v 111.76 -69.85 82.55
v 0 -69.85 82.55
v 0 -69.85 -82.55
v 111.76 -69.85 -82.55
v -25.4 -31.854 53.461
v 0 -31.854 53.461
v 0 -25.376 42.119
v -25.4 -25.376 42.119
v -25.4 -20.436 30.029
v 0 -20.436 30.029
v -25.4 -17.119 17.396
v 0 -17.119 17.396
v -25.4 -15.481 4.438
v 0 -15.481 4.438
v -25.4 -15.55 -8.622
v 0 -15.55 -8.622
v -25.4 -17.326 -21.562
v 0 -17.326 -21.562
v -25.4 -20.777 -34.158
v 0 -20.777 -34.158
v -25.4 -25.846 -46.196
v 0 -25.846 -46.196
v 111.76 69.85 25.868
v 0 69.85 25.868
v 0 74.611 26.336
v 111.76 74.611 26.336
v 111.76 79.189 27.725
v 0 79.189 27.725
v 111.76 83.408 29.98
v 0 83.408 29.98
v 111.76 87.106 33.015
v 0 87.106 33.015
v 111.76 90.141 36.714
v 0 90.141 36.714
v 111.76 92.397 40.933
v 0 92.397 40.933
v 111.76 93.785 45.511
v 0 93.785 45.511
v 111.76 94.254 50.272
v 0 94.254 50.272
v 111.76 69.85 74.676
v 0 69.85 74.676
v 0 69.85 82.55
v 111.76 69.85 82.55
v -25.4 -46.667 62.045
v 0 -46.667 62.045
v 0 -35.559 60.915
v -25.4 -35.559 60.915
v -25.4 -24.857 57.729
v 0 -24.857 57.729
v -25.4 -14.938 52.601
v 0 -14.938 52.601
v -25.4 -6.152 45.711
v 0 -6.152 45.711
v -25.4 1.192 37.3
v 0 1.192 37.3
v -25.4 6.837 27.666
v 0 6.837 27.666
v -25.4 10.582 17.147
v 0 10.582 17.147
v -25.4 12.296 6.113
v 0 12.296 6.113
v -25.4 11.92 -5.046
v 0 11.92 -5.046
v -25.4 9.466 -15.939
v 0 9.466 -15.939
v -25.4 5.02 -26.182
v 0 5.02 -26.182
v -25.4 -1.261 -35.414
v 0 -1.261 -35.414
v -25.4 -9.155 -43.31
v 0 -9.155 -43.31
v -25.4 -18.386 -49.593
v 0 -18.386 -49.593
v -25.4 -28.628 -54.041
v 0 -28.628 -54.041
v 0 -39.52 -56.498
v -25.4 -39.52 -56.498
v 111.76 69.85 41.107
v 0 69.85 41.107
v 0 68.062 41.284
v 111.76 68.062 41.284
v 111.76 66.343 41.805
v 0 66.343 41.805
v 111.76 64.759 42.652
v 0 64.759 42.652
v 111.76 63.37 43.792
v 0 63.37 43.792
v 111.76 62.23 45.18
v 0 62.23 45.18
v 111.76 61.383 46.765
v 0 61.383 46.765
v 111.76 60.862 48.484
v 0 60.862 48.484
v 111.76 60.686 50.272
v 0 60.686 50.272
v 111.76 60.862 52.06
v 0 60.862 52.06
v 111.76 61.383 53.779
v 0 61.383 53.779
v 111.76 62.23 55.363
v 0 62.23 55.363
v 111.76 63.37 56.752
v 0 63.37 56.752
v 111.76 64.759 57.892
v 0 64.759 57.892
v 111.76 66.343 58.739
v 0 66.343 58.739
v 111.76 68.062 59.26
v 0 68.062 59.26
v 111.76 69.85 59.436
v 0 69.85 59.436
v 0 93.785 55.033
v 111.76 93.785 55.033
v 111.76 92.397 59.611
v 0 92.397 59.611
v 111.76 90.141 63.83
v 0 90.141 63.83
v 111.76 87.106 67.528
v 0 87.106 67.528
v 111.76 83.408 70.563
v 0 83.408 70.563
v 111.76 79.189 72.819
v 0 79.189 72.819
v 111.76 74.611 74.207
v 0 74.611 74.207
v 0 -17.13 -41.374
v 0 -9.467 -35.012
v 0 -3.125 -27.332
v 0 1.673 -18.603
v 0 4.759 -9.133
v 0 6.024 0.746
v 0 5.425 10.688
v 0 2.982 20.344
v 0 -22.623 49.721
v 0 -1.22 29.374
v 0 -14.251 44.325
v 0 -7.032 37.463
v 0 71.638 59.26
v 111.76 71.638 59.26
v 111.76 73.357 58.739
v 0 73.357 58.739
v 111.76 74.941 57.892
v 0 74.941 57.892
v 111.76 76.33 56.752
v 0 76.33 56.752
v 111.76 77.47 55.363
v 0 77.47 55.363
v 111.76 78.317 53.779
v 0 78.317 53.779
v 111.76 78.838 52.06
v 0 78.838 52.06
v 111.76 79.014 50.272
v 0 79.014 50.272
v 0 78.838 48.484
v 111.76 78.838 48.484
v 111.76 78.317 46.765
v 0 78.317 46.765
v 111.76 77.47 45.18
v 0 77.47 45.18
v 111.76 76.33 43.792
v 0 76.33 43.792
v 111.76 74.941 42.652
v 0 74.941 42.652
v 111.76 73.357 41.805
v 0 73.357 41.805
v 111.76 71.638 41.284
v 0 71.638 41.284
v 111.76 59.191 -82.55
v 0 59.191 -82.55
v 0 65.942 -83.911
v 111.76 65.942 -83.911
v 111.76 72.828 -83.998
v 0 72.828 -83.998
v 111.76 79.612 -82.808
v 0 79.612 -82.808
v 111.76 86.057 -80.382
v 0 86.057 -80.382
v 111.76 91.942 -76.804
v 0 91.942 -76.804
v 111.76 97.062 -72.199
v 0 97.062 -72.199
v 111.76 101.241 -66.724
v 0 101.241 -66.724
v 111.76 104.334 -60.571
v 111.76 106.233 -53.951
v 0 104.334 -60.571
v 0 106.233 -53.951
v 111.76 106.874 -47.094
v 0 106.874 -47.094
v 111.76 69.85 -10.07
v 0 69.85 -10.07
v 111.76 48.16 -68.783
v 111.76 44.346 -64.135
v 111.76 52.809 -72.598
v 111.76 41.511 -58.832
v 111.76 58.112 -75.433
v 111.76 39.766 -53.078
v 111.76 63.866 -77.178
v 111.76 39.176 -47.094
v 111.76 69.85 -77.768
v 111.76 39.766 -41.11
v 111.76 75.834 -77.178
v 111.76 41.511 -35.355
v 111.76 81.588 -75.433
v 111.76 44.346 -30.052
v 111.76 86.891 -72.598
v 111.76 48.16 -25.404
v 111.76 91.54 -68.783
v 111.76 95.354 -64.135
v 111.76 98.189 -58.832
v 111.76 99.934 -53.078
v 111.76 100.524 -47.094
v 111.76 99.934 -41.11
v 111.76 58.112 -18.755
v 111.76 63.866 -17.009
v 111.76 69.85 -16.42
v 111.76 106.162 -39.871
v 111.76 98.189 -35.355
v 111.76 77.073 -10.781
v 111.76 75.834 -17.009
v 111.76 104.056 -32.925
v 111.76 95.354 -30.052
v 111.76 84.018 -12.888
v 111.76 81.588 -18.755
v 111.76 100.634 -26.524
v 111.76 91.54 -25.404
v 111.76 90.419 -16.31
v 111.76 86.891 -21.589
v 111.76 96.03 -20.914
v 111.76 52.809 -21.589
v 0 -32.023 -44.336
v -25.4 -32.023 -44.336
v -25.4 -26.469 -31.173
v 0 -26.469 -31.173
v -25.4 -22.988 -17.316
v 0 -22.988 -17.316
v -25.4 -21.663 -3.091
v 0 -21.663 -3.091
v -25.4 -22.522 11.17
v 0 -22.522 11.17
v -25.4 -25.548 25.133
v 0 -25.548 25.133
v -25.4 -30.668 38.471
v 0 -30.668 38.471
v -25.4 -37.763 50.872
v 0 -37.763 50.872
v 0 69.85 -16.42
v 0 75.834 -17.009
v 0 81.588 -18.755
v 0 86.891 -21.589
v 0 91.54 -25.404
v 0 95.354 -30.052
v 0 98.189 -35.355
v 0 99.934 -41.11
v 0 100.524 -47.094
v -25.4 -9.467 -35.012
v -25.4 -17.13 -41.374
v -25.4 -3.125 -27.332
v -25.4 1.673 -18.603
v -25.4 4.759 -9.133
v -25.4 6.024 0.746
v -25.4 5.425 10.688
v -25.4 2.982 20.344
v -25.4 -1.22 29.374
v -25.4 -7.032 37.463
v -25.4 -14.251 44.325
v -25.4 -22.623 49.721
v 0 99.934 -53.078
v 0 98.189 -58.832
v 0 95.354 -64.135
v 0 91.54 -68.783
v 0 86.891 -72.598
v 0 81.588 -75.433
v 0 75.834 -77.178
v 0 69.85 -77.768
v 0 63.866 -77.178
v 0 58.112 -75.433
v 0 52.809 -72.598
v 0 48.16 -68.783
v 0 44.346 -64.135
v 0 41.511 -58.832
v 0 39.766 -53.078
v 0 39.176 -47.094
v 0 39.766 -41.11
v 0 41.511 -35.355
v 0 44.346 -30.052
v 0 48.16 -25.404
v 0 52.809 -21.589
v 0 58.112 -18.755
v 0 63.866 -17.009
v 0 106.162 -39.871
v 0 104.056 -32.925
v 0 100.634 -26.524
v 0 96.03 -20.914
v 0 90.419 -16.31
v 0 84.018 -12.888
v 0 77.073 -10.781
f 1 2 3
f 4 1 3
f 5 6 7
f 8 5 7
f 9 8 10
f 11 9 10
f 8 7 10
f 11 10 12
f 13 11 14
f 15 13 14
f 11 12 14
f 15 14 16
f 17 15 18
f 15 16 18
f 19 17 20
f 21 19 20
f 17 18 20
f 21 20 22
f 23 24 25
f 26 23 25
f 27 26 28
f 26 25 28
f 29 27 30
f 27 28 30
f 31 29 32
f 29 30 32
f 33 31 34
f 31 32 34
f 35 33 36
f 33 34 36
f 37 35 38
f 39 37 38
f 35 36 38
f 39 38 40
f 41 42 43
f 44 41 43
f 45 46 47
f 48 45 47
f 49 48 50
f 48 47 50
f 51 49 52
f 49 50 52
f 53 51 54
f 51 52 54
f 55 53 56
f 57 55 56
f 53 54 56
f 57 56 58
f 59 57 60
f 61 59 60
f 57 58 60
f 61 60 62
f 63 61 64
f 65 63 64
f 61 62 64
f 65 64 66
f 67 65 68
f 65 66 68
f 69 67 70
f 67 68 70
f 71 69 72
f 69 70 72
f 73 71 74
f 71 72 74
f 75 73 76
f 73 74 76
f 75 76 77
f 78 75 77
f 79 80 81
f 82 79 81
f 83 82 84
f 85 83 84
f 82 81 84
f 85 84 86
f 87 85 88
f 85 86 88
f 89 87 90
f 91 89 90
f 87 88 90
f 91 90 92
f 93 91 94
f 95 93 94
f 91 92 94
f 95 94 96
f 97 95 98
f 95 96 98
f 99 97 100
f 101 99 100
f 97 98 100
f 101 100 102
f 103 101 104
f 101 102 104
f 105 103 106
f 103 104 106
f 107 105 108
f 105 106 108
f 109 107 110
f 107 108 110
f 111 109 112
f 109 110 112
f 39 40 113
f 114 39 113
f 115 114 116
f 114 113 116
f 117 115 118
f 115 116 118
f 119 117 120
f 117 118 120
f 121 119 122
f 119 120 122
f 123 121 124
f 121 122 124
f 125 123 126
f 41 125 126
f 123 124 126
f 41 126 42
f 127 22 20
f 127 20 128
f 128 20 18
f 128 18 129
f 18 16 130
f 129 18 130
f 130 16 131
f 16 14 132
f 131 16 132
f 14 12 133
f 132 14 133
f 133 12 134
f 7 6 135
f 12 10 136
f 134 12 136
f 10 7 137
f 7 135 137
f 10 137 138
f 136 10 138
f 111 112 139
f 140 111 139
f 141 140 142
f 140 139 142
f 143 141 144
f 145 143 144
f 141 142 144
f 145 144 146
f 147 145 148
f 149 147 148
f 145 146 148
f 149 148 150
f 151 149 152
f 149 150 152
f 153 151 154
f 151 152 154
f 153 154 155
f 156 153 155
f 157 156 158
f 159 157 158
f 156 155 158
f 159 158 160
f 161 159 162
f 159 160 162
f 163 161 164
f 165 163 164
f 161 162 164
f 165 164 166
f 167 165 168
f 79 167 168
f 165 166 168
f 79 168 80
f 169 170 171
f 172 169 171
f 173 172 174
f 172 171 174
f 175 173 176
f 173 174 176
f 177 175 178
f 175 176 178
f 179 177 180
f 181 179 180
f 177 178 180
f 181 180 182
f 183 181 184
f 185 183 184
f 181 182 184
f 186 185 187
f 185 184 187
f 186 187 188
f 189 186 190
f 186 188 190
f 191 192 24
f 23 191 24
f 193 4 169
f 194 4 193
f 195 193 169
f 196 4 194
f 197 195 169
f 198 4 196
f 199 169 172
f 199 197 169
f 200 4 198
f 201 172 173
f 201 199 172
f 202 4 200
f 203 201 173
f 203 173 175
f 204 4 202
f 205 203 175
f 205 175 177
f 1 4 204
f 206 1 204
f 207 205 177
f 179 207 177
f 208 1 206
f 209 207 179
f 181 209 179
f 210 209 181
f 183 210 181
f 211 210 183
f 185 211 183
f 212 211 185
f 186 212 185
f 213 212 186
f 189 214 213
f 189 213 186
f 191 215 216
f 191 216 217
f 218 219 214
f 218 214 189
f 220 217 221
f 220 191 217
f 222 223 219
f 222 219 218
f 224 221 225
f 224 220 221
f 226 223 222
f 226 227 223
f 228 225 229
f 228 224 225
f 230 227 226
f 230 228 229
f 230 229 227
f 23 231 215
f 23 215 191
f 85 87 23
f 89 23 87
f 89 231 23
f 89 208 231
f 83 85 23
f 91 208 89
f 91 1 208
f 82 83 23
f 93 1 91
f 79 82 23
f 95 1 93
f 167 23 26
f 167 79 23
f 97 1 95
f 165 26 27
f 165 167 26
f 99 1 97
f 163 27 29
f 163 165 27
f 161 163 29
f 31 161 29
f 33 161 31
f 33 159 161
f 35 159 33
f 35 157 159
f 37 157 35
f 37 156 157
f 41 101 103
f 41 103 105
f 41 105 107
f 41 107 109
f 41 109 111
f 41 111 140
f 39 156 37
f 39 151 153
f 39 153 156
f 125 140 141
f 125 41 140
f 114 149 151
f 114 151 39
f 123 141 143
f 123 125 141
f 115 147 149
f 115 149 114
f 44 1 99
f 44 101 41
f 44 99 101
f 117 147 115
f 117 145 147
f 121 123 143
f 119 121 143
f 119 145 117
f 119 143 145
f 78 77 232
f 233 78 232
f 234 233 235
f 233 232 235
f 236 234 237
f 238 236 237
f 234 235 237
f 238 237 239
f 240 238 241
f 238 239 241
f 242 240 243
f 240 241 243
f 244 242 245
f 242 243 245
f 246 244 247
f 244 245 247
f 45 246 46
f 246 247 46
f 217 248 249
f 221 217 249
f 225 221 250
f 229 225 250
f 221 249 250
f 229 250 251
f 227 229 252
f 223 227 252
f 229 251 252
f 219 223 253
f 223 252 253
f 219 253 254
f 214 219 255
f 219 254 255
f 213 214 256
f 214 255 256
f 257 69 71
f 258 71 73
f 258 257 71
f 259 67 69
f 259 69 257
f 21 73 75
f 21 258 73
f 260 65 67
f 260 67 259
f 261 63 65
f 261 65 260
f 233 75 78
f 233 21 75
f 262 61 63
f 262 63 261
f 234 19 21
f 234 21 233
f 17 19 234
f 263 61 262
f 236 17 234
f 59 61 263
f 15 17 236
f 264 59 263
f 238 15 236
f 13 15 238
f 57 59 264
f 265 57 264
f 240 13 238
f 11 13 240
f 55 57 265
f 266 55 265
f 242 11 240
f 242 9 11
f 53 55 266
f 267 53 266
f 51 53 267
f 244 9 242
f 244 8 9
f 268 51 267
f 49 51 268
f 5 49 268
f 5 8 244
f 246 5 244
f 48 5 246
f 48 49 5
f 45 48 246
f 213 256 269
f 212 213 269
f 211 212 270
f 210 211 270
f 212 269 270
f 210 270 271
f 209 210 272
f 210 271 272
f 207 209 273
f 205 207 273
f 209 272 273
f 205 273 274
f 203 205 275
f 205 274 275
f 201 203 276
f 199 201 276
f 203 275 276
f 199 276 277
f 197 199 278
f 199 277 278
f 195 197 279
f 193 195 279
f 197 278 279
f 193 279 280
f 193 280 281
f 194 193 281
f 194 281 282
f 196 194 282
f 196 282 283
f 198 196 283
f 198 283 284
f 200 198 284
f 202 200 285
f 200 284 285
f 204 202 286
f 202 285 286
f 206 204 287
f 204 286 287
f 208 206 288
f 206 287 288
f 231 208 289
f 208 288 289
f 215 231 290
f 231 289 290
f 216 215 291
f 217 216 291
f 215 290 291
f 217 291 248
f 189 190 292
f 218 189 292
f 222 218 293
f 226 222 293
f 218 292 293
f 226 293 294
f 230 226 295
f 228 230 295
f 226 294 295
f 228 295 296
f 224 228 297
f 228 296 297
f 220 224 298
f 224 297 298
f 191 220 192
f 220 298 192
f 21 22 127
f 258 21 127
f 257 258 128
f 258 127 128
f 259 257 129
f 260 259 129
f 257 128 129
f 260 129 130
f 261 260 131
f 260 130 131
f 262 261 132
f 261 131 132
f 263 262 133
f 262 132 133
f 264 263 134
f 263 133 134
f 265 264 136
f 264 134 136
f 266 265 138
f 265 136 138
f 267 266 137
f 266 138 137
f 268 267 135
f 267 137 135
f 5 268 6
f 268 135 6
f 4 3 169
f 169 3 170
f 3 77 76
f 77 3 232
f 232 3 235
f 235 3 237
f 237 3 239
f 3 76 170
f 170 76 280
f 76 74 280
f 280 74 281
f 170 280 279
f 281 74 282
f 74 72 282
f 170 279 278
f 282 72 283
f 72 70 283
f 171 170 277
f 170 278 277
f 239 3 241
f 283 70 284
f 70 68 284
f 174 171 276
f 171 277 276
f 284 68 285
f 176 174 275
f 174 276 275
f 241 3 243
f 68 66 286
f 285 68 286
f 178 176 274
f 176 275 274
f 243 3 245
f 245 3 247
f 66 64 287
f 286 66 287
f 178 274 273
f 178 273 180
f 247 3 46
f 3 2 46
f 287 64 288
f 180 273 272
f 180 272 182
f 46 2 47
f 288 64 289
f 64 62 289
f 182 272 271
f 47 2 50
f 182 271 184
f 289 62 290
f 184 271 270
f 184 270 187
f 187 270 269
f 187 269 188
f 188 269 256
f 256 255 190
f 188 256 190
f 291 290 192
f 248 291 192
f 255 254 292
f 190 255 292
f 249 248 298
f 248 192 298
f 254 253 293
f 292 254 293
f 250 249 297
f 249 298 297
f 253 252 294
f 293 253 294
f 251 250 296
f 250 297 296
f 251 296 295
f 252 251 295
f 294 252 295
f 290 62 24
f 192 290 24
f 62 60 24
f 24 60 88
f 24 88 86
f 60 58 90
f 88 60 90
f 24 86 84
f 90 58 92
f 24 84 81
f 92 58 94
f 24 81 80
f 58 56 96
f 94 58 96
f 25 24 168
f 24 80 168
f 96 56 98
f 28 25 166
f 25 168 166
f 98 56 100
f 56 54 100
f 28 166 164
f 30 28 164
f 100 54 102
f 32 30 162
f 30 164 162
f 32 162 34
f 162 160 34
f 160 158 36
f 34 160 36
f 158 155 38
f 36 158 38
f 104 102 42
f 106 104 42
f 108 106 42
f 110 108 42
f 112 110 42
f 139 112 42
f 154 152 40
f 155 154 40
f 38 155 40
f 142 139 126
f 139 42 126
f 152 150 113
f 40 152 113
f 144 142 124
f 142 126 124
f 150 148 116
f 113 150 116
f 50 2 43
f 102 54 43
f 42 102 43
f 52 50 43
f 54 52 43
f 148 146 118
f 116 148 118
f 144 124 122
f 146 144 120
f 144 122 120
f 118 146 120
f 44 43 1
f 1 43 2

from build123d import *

# Parameters (mm, degrees)
F1_DEPTH = 111.76
F4_DEPTH = 25.4


with BuildPart() as f1:
    # F0 (on Right) → F1 (new body)
    with BuildSketch(Plane.YZ):
        with BuildLine():
            ThreePointArc((59.190566269, -82.55), (33.2201620113, -41.7067588395), (69.85, -10.0699572513))
            Line((69.85, -10.0699572513), (69.85, 25.8675002325))
            ThreePointArc((69.85, 25.8675002325), (45.4456650544, 50.2718351781), (69.85, 74.6761701237))
            Line((69.85, 74.6761701237), (69.85, 82.55))
            Line((69.85, 82.55), (-69.85, 82.55))
            Line((-69.85, 82.55), (-69.85, -82.55))
            Line((-69.85, -82.55), (59.190566269, -82.55))
        make_face()
        with BuildLine():
            ThreePointArc((59.190566269, -82.55), (91.9419900175, -76.8042285794), (106.8738476743, -47.0938049257))
            ThreePointArc((106.8738476743, -47.0938049257), (96.0298137561, -20.9139911695), (69.85, -10.0699572513))
            Line((69.85, -10.0699572513), (69.85, -16.4199572513))
            ThreePointArc((69.85, -16.4199572513), (91.5396856956, -25.4041192301), (100.5238476743, -47.0938049257))
            ThreePointArc((100.5238476743, -47.0938049257), (91.5396856956, -68.7834906213), (69.85, -77.7676526))
            Line((69.85, -77.7676526), (69.85, -82.55))
            Line((69.85, -82.55), (59.190566269, -82.55))
        make_face()
        with BuildLine():
            Line((69.85, 41.1074995935), (69.85, 25.8675002325))
            ThreePointArc((69.85, 25.8675002325), (87.1064707304, 33.0153644477), (94.2543349456, 50.2718351781))
            ThreePointArc((94.2543349456, 50.2718351781), (87.1064707304, 67.5283059085), (69.85, 74.6761701237))
            Line((69.85, 74.6761701237), (69.85, 59.4361707628))
            ThreePointArc((69.85, 59.4361707628), (76.330163837, 56.7519990151), (79.0143355846, 50.2718351781))
            ThreePointArc((79.0143355846, 50.2718351781), (76.330163837, 43.7916713412), (69.85, 41.1074995935))
        make_face()
        with BuildLine():
            Line((69.85, -16.4199572513), (69.85, -10.0699572513))
            ThreePointArc((69.85, -10.0699572513), (33.2201620113, -41.7067588395), (59.190566269, -82.55))
            Line((59.190566269, -82.55), (69.85, -82.55))
            Line((69.85, -82.55), (69.85, -77.7676526))
            ThreePointArc((69.85, -77.7676526), (39.1761523257, -47.0938049257), (69.85, -16.4199572513))
        make_face()
        with BuildLine():
            ThreePointArc((69.85, 74.6761701237), (45.4456650544, 50.2718351781), (69.85, 25.8675002325))
            Line((69.85, 25.8675002325), (69.85, 41.1074995935))
            ThreePointArc((69.85, 41.1074995935), (60.6856644154, 50.2718351781), (69.85, 59.4361707628))
            Line((69.85, 59.4361707628), (69.85, 74.6761701237))
        make_face()
    extrude(amount=F1_DEPTH)

    # F3 (on face) → F4 (join)
    with BuildSketch(Plane(origin=(0, 0, 0), x_dir=(0, -1, 0), z_dir=(-1, 0, 0))):
        with BuildLine():
            ThreePointArc((39.5199386348, -56.4979792395), (21.8193266657, 4.0562435302), (46.667368415, 62.045038832))
            ThreePointArc((46.667368415, 62.045038832), (-12.2964336182, 6.1132183314), (39.5199386348, -56.4979792395))
        make_face()
        with BuildLine():
            ThreePointArc((25.8455574512, -46.1958609521), (-5.9579445218, 5.7310456276), (31.8542383611, 53.4605458379))
            ThreePointArc((31.8542383611, 53.4605458379), (15.4808375694, 4.438416234), (25.8455574512, -46.1958609521))
        make_face(mode=Mode.SUBTRACT)
    extrude(amount=F4_DEPTH)


solid = f1.part
